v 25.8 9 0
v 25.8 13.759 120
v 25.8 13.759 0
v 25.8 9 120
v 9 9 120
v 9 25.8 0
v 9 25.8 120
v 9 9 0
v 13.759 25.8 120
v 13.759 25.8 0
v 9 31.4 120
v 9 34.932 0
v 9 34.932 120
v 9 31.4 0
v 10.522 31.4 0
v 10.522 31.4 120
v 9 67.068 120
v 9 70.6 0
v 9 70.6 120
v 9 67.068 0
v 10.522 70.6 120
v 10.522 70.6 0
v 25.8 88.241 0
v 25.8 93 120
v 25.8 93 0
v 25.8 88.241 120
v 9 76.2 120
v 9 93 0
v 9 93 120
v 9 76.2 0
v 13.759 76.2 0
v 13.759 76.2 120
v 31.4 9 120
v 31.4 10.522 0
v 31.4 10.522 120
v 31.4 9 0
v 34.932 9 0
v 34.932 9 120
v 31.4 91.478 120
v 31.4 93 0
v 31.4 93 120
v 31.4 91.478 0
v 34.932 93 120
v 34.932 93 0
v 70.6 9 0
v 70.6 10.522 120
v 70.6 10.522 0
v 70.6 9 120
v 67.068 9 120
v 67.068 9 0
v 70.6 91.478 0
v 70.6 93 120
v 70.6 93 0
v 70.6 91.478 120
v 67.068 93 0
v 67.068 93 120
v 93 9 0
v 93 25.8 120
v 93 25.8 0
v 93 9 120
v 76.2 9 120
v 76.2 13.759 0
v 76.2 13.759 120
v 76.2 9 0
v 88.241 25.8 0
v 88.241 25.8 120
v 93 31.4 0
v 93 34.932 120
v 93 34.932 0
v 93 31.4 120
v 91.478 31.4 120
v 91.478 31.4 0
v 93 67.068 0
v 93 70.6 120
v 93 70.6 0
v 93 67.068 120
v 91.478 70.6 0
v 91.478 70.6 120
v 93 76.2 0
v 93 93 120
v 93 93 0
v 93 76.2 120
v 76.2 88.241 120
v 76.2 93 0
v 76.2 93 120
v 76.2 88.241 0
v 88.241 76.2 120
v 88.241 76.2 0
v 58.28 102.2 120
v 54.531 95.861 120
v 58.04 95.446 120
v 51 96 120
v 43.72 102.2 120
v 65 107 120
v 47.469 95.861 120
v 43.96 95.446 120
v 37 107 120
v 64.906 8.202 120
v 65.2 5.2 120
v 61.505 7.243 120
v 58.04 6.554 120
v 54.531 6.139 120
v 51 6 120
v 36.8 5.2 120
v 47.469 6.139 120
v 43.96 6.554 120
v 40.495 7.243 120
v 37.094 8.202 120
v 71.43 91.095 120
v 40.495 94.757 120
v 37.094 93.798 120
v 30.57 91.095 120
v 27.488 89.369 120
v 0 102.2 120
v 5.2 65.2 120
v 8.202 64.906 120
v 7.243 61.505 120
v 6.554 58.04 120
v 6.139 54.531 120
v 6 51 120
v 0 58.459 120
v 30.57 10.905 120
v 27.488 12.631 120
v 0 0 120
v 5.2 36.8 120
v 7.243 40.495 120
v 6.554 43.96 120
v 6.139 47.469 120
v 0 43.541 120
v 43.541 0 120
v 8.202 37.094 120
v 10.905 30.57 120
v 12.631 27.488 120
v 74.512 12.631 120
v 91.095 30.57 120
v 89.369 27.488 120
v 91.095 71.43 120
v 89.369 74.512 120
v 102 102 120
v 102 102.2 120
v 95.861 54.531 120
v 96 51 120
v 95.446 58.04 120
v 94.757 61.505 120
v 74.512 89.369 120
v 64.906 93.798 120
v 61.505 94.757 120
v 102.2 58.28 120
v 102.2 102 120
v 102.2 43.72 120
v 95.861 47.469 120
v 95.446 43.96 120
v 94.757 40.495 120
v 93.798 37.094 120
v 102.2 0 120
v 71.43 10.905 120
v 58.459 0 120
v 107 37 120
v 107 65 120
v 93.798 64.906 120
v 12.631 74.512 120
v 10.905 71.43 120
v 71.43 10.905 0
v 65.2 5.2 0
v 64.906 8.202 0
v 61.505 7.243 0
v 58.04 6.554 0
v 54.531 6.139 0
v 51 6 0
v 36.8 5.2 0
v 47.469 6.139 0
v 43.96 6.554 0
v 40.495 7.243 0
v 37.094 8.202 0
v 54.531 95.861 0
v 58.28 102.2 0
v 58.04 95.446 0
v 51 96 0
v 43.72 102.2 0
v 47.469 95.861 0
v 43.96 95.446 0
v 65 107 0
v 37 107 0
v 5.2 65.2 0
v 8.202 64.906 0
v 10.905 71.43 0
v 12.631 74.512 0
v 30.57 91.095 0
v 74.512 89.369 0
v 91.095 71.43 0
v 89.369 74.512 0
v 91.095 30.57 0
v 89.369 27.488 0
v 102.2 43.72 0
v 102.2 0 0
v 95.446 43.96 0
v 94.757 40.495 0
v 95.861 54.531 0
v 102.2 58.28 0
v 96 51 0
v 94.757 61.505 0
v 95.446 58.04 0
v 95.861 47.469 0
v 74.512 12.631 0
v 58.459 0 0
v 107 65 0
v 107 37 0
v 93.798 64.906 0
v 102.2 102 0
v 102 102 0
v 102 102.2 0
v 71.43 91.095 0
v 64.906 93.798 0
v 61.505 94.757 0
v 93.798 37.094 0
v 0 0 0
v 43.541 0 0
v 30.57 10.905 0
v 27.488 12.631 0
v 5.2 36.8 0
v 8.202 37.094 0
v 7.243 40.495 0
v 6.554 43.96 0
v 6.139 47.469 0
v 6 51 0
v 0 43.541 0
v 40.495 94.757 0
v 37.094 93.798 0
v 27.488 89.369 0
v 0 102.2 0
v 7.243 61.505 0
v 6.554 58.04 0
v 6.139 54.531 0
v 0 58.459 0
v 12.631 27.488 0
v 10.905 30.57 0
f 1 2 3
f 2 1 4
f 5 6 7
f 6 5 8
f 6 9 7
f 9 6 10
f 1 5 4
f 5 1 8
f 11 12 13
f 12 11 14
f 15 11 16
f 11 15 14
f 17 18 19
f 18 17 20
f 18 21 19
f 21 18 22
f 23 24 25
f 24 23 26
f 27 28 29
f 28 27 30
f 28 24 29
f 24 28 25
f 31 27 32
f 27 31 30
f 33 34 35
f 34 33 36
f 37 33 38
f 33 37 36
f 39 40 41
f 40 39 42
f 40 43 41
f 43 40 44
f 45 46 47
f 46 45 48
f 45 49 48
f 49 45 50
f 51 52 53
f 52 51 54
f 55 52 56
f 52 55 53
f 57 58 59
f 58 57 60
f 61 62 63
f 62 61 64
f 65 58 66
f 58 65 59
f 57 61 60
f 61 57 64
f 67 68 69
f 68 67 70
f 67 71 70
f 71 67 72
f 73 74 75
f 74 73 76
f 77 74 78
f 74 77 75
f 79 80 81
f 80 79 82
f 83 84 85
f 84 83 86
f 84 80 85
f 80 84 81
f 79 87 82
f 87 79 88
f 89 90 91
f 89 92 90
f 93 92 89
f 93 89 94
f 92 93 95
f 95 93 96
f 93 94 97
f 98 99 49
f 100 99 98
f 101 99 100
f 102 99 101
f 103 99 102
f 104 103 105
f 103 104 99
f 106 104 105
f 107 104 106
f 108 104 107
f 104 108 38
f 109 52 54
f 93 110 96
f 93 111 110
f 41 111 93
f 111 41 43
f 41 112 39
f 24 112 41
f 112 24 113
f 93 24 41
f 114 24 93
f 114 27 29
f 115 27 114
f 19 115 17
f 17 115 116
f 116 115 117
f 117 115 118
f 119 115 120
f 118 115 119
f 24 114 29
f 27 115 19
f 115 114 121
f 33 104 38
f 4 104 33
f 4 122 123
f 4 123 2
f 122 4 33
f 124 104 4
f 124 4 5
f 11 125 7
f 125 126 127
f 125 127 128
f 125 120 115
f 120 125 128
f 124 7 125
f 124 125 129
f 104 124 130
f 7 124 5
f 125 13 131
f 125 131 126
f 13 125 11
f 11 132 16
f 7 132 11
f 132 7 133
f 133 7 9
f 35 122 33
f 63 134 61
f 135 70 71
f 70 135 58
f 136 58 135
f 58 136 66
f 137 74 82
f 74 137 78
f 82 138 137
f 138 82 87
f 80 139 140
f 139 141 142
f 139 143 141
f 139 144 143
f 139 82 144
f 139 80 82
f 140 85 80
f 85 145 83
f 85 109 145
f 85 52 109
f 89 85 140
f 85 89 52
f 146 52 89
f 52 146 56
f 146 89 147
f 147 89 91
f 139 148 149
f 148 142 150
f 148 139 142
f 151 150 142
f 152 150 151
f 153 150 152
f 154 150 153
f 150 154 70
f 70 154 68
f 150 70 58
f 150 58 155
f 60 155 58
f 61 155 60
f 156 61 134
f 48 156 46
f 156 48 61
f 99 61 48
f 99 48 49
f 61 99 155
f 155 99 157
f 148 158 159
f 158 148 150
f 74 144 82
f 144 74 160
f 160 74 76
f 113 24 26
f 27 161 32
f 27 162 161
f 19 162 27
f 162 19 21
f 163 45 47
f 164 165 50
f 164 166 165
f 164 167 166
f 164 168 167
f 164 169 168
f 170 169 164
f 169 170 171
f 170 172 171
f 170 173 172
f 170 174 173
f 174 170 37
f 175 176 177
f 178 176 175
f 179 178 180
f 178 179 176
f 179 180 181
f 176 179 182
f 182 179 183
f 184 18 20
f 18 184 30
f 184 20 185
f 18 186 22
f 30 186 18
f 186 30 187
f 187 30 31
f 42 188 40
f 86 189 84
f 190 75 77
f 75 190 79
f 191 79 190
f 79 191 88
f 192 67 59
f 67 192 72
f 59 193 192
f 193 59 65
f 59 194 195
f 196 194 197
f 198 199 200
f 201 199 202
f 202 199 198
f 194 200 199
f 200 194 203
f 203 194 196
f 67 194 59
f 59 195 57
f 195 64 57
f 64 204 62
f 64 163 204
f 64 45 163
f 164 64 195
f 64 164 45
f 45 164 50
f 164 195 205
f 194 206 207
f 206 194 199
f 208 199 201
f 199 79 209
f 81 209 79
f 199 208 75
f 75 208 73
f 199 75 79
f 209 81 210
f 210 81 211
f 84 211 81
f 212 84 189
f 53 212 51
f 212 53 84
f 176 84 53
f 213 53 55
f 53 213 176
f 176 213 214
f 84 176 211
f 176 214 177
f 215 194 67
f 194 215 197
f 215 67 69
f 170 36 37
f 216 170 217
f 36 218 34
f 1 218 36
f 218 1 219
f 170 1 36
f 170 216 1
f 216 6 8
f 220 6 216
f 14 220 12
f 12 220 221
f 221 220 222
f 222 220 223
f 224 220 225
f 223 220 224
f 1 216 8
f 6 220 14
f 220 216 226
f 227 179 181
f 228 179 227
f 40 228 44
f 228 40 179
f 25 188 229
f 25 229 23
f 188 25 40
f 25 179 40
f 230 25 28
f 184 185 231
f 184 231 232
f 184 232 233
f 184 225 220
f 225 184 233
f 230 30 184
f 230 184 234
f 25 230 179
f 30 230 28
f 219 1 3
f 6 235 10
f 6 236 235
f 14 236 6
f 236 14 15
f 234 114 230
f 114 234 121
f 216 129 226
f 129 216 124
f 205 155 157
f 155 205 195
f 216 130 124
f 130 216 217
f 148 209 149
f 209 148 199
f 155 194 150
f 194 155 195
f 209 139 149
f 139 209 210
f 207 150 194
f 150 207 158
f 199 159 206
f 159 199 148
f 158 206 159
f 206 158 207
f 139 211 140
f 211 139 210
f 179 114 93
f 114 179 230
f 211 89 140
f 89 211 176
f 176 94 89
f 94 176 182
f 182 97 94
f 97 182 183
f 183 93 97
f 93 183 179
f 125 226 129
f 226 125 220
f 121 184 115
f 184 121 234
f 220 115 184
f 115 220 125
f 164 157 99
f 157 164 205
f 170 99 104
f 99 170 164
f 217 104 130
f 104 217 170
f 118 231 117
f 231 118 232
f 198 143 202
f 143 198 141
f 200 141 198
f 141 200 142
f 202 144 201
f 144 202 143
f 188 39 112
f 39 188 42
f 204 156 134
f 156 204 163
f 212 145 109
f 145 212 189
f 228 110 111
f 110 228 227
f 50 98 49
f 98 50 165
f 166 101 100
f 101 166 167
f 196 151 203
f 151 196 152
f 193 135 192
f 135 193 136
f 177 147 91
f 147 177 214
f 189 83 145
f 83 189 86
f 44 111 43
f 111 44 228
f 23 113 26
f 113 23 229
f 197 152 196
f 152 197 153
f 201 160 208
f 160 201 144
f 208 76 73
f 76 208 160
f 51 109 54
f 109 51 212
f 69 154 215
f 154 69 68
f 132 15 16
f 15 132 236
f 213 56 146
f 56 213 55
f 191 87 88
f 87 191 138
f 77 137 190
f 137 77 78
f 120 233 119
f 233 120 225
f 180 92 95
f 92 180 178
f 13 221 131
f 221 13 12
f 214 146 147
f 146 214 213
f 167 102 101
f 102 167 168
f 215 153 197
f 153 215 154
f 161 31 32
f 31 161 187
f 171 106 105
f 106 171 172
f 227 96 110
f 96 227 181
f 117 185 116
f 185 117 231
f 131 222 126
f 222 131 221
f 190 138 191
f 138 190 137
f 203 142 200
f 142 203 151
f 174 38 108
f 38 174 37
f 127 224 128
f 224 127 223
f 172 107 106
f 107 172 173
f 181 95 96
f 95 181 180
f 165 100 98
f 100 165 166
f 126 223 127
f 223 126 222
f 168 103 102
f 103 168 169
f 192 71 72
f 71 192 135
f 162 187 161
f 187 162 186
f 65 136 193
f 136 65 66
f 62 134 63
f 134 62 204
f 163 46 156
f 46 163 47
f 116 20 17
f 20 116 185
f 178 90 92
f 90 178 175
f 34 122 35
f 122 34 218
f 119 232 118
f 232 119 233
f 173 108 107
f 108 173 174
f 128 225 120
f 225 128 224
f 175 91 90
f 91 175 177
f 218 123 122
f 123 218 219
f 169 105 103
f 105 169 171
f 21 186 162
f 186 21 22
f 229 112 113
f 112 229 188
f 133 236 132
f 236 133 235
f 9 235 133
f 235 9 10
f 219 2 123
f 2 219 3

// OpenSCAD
// --- Parameters ---
/* [What to Render] */
Part = "core"; // [core, flat_spacer, dovetail_male, dovetail_female]

/* [Dimensions] */
// The internal size of the hole (e.g., 90 for wine, 140 for large box)
Internal_Size = 90; 
Depth = 120; 
Wall_Thickness = 6; // Thicker walls look better as a skeleton

// Only used if Part == "core"
Core_Type = "bottle"; // [bottle, box]

// How much to add to make it reach the next "grid" size
Spacer_Width = 50; 

/* [Skeletonization] */
// How much material to leave (1.0 = solid, 0.1 = skeleton). Adjust for strength.
Skeleton_Factor = 0.25; // [0.1:0.05:0.9]

/* [Dovetail Settings] */
// Fixed dovetail size (locked): do not scale with any other setting.
DT_Width = 14;
DT_Height = 5;
Clearance = 0.2; 
DT_Left = "female";   // [none, male, female]
DT_Right = "male";    // [none, male, female]
DT_Top = "male";      // [none, male, female]
DT_Bottom = "female"; // [none, male, female]

// --- Calculations ---
$fn = 80;
Outer_Size = Internal_Size + (Wall_Thickness * 2);
Cutout_Thickness = Wall_Thickness * (1 - Skeleton_Factor);
// Locked values used everywhere so dovetail size stays constant.
DT_Width_Effective = 14;
DT_Height_Effective = 5;
DT_Join_Overlap = 0.4;

module dovetail(w, h, buffer=0) {
    polygon(points=[
        [0 - buffer, 0 - buffer], 
        [w + buffer, 0 - buffer], 
        [w * 1.5 + buffer, h + buffer], 
        [-w * 0.5 - buffer, h + buffer]
    ]);
}

module add_male(side, dim_x, dim_y, dim_z) {
    if (side == "left")
        translate([0, (dim_y/2) - (DT_Width_Effective/2), 0]) rotate([0, 0, 90]) linear_extrude(dim_z) dovetail(DT_Width_Effective, DT_Height_Effective);
    else if (side == "right")
        translate([dim_x, (dim_y/2) + (DT_Width_Effective/2), 0]) rotate([0, 0, -90]) linear_extrude(dim_z) dovetail(DT_Width_Effective, DT_Height_Effective);
    else if (side == "top")
        translate([(dim_x/2) - (DT_Width_Effective/2), dim_y, 0]) rotate([0, 0, 0]) linear_extrude(dim_z) dovetail(DT_Width_Effective, DT_Height_Effective);
    else if (side == "bottom")
        translate([(dim_x/2) + (DT_Width_Effective/2), 0, 0]) rotate([0, 0, 180]) linear_extrude(dim_z) dovetail(DT_Width_Effective, DT_Height_Effective);
}

module cut_female(side, dim_x, dim_y, dim_z) {
    if (side == "left")
        translate([0, (dim_y/2) + (DT_Width_Effective/2), -1]) rotate([0, 0, -90]) linear_extrude(dim_z + 2) dovetail(DT_Width_Effective, DT_Height_Effective, Clearance);
    else if (side == "right")
        translate([dim_x, (dim_y/2) + (DT_Width_Effective/2), -1]) rotate([0, 0, 90]) linear_extrude(dim_z + 2) dovetail(DT_Width_Effective, DT_Height_Effective, Clearance);
    else if (side == "top")
        translate([(dim_x/2) + (DT_Width_Effective/2), dim_y, -1]) rotate([0, 0, 180]) linear_extrude(dim_z + 2) dovetail(DT_Width_Effective, DT_Height_Effective, Clearance);
    else if (side == "bottom")
        translate([(dim_x/2) - (DT_Width_Effective/2), 0, -1]) rotate([0, 0, 0]) linear_extrude(dim_z + 2) dovetail(DT_Width_Effective, DT_Height_Effective, Clearance);
}

module side_connectors_add(dim_x, dim_y, dim_z) {
    if (DT_Left == "male") {
        // Force connector-to-body overlap so STL is one connected shell.
        translate([-DT_Join_Overlap/2, 0, 0]) cube([DT_Join_Overlap, dim_y, dim_z]);
        add_male("left", dim_x, dim_y, dim_z);
    }
    if (DT_Right == "male") {
        translate([dim_x - (DT_Join_Overlap/2), 0, 0]) cube([DT_Join_Overlap, dim_y, dim_z]);
        add_male("right", dim_x, dim_y, dim_z);
    }
    if (DT_Top == "male") {
        translate([0, dim_y - (DT_Join_Overlap/2), 0]) cube([dim_x, DT_Join_Overlap, dim_z]);
        add_male("top", dim_x, dim_y, dim_z);
    }
    if (DT_Bottom == "male") {
        translate([0, -DT_Join_Overlap/2, 0]) cube([dim_x, DT_Join_Overlap, dim_z]);
        add_male("bottom", dim_x, dim_y, dim_z);
    }
}

module side_connectors_cut(dim_x, dim_y, dim_z) {
    if (DT_Left == "female") cut_female("left", dim_x, dim_y, dim_z);
    if (DT_Right == "female") cut_female("right", dim_x, dim_y, dim_z);
    if (DT_Top == "female") cut_female("top", dim_x, dim_y, dim_z);
    if (DT_Bottom == "female") cut_female("bottom", dim_x, dim_y, dim_z);
}

// Module to subtract material and create the skeleton
module skeletonize(dim_x, dim_y, dim_z) {
    difference() {
        children();
        
        // Subtract cubes along the Z-axis (Depth)
        if (Cutout_Thickness > 0) {
            num_cutouts = 4; // Adjust for complexity
            // Keep a solid perimeter so dovetail zones remain one piece.
            edge_solid_band = max(Wall_Thickness, DT_Height_Effective + Clearance + 1);
            inner_x = dim_x - (edge_solid_band * 2);
            inner_y = dim_y - (edge_solid_band * 2);
            size_x = inner_x / num_cutouts;
            size_y = inner_y / num_cutouts;

            if (inner_x > 0 && inner_y > 0) {
                for (i = [0 : num_cutouts - 1]) {
                    for (j = [0 : num_cutouts - 1]) {
                        translate([edge_solid_band + (i * size_x) + (size_x * Skeleton_Factor/2), 
                                   edge_solid_band + (j * size_y) + (size_y * Skeleton_Factor/2), 
                                   -1])
                            cube([size_x * (1-Skeleton_Factor), size_y * (1-Skeleton_Factor), dim_z + 2]);
                    }
                }
            }
        }
    }
}

// --- Logic ---

if (Part == "core") {
    difference() {
        union() {
            // SKELETONIZED CORE
            skeletonize(Outer_Size, Outer_Size, Depth) {
                cube([Outer_Size, Outer_Size, Depth]);
            }
            side_connectors_add(Outer_Size, Outer_Size, Depth);
        }
        // Hole Cutout
        translate([Outer_Size/2, Outer_Size/2, -1]) {
            if (Core_Type == "bottle") {
                cylinder(h = Depth + 2, d = Internal_Size);
            } else {
                // Match bottle behavior: cut all the way through depth.
                translate([-Internal_Size/2, -Internal_Size/2, 0])
                    cube([Internal_Size, Internal_Size, Depth + 2]);
            }
        }
        side_connectors_cut(Outer_Size, Outer_Size, Depth);
    }
}

if (Part == "flat_spacer") {
    difference() {
        union() {
            // SKELETONIZED FLAT SPACER
            skeletonize(Spacer_Width, Outer_Size, Depth) {
                cube([Spacer_Width, Outer_Size, Depth]);
            }
            side_connectors_add(Spacer_Width, Outer_Size, Depth);
        }
        side_connectors_cut(Spacer_Width, Outer_Size, Depth);
    }
}

if (Part == "dovetail_male") {
    linear_extrude(Depth) dovetail(DT_Width_Effective, DT_Height_Effective);
}

if (Part == "dovetail_female") {
    block_w = (DT_Width_Effective * 2) + (DT_Height_Effective * 3);
    difference() {
        cube([block_w, DT_Height_Effective + (Wall_Thickness * 2), Depth]);
        translate([(block_w/2) - (DT_Width_Effective/2), Wall_Thickness, -1])
            linear_extrude(Depth + 2) dovetail(DT_Width_Effective, DT_Height_Effective, Clearance);
    }
}
